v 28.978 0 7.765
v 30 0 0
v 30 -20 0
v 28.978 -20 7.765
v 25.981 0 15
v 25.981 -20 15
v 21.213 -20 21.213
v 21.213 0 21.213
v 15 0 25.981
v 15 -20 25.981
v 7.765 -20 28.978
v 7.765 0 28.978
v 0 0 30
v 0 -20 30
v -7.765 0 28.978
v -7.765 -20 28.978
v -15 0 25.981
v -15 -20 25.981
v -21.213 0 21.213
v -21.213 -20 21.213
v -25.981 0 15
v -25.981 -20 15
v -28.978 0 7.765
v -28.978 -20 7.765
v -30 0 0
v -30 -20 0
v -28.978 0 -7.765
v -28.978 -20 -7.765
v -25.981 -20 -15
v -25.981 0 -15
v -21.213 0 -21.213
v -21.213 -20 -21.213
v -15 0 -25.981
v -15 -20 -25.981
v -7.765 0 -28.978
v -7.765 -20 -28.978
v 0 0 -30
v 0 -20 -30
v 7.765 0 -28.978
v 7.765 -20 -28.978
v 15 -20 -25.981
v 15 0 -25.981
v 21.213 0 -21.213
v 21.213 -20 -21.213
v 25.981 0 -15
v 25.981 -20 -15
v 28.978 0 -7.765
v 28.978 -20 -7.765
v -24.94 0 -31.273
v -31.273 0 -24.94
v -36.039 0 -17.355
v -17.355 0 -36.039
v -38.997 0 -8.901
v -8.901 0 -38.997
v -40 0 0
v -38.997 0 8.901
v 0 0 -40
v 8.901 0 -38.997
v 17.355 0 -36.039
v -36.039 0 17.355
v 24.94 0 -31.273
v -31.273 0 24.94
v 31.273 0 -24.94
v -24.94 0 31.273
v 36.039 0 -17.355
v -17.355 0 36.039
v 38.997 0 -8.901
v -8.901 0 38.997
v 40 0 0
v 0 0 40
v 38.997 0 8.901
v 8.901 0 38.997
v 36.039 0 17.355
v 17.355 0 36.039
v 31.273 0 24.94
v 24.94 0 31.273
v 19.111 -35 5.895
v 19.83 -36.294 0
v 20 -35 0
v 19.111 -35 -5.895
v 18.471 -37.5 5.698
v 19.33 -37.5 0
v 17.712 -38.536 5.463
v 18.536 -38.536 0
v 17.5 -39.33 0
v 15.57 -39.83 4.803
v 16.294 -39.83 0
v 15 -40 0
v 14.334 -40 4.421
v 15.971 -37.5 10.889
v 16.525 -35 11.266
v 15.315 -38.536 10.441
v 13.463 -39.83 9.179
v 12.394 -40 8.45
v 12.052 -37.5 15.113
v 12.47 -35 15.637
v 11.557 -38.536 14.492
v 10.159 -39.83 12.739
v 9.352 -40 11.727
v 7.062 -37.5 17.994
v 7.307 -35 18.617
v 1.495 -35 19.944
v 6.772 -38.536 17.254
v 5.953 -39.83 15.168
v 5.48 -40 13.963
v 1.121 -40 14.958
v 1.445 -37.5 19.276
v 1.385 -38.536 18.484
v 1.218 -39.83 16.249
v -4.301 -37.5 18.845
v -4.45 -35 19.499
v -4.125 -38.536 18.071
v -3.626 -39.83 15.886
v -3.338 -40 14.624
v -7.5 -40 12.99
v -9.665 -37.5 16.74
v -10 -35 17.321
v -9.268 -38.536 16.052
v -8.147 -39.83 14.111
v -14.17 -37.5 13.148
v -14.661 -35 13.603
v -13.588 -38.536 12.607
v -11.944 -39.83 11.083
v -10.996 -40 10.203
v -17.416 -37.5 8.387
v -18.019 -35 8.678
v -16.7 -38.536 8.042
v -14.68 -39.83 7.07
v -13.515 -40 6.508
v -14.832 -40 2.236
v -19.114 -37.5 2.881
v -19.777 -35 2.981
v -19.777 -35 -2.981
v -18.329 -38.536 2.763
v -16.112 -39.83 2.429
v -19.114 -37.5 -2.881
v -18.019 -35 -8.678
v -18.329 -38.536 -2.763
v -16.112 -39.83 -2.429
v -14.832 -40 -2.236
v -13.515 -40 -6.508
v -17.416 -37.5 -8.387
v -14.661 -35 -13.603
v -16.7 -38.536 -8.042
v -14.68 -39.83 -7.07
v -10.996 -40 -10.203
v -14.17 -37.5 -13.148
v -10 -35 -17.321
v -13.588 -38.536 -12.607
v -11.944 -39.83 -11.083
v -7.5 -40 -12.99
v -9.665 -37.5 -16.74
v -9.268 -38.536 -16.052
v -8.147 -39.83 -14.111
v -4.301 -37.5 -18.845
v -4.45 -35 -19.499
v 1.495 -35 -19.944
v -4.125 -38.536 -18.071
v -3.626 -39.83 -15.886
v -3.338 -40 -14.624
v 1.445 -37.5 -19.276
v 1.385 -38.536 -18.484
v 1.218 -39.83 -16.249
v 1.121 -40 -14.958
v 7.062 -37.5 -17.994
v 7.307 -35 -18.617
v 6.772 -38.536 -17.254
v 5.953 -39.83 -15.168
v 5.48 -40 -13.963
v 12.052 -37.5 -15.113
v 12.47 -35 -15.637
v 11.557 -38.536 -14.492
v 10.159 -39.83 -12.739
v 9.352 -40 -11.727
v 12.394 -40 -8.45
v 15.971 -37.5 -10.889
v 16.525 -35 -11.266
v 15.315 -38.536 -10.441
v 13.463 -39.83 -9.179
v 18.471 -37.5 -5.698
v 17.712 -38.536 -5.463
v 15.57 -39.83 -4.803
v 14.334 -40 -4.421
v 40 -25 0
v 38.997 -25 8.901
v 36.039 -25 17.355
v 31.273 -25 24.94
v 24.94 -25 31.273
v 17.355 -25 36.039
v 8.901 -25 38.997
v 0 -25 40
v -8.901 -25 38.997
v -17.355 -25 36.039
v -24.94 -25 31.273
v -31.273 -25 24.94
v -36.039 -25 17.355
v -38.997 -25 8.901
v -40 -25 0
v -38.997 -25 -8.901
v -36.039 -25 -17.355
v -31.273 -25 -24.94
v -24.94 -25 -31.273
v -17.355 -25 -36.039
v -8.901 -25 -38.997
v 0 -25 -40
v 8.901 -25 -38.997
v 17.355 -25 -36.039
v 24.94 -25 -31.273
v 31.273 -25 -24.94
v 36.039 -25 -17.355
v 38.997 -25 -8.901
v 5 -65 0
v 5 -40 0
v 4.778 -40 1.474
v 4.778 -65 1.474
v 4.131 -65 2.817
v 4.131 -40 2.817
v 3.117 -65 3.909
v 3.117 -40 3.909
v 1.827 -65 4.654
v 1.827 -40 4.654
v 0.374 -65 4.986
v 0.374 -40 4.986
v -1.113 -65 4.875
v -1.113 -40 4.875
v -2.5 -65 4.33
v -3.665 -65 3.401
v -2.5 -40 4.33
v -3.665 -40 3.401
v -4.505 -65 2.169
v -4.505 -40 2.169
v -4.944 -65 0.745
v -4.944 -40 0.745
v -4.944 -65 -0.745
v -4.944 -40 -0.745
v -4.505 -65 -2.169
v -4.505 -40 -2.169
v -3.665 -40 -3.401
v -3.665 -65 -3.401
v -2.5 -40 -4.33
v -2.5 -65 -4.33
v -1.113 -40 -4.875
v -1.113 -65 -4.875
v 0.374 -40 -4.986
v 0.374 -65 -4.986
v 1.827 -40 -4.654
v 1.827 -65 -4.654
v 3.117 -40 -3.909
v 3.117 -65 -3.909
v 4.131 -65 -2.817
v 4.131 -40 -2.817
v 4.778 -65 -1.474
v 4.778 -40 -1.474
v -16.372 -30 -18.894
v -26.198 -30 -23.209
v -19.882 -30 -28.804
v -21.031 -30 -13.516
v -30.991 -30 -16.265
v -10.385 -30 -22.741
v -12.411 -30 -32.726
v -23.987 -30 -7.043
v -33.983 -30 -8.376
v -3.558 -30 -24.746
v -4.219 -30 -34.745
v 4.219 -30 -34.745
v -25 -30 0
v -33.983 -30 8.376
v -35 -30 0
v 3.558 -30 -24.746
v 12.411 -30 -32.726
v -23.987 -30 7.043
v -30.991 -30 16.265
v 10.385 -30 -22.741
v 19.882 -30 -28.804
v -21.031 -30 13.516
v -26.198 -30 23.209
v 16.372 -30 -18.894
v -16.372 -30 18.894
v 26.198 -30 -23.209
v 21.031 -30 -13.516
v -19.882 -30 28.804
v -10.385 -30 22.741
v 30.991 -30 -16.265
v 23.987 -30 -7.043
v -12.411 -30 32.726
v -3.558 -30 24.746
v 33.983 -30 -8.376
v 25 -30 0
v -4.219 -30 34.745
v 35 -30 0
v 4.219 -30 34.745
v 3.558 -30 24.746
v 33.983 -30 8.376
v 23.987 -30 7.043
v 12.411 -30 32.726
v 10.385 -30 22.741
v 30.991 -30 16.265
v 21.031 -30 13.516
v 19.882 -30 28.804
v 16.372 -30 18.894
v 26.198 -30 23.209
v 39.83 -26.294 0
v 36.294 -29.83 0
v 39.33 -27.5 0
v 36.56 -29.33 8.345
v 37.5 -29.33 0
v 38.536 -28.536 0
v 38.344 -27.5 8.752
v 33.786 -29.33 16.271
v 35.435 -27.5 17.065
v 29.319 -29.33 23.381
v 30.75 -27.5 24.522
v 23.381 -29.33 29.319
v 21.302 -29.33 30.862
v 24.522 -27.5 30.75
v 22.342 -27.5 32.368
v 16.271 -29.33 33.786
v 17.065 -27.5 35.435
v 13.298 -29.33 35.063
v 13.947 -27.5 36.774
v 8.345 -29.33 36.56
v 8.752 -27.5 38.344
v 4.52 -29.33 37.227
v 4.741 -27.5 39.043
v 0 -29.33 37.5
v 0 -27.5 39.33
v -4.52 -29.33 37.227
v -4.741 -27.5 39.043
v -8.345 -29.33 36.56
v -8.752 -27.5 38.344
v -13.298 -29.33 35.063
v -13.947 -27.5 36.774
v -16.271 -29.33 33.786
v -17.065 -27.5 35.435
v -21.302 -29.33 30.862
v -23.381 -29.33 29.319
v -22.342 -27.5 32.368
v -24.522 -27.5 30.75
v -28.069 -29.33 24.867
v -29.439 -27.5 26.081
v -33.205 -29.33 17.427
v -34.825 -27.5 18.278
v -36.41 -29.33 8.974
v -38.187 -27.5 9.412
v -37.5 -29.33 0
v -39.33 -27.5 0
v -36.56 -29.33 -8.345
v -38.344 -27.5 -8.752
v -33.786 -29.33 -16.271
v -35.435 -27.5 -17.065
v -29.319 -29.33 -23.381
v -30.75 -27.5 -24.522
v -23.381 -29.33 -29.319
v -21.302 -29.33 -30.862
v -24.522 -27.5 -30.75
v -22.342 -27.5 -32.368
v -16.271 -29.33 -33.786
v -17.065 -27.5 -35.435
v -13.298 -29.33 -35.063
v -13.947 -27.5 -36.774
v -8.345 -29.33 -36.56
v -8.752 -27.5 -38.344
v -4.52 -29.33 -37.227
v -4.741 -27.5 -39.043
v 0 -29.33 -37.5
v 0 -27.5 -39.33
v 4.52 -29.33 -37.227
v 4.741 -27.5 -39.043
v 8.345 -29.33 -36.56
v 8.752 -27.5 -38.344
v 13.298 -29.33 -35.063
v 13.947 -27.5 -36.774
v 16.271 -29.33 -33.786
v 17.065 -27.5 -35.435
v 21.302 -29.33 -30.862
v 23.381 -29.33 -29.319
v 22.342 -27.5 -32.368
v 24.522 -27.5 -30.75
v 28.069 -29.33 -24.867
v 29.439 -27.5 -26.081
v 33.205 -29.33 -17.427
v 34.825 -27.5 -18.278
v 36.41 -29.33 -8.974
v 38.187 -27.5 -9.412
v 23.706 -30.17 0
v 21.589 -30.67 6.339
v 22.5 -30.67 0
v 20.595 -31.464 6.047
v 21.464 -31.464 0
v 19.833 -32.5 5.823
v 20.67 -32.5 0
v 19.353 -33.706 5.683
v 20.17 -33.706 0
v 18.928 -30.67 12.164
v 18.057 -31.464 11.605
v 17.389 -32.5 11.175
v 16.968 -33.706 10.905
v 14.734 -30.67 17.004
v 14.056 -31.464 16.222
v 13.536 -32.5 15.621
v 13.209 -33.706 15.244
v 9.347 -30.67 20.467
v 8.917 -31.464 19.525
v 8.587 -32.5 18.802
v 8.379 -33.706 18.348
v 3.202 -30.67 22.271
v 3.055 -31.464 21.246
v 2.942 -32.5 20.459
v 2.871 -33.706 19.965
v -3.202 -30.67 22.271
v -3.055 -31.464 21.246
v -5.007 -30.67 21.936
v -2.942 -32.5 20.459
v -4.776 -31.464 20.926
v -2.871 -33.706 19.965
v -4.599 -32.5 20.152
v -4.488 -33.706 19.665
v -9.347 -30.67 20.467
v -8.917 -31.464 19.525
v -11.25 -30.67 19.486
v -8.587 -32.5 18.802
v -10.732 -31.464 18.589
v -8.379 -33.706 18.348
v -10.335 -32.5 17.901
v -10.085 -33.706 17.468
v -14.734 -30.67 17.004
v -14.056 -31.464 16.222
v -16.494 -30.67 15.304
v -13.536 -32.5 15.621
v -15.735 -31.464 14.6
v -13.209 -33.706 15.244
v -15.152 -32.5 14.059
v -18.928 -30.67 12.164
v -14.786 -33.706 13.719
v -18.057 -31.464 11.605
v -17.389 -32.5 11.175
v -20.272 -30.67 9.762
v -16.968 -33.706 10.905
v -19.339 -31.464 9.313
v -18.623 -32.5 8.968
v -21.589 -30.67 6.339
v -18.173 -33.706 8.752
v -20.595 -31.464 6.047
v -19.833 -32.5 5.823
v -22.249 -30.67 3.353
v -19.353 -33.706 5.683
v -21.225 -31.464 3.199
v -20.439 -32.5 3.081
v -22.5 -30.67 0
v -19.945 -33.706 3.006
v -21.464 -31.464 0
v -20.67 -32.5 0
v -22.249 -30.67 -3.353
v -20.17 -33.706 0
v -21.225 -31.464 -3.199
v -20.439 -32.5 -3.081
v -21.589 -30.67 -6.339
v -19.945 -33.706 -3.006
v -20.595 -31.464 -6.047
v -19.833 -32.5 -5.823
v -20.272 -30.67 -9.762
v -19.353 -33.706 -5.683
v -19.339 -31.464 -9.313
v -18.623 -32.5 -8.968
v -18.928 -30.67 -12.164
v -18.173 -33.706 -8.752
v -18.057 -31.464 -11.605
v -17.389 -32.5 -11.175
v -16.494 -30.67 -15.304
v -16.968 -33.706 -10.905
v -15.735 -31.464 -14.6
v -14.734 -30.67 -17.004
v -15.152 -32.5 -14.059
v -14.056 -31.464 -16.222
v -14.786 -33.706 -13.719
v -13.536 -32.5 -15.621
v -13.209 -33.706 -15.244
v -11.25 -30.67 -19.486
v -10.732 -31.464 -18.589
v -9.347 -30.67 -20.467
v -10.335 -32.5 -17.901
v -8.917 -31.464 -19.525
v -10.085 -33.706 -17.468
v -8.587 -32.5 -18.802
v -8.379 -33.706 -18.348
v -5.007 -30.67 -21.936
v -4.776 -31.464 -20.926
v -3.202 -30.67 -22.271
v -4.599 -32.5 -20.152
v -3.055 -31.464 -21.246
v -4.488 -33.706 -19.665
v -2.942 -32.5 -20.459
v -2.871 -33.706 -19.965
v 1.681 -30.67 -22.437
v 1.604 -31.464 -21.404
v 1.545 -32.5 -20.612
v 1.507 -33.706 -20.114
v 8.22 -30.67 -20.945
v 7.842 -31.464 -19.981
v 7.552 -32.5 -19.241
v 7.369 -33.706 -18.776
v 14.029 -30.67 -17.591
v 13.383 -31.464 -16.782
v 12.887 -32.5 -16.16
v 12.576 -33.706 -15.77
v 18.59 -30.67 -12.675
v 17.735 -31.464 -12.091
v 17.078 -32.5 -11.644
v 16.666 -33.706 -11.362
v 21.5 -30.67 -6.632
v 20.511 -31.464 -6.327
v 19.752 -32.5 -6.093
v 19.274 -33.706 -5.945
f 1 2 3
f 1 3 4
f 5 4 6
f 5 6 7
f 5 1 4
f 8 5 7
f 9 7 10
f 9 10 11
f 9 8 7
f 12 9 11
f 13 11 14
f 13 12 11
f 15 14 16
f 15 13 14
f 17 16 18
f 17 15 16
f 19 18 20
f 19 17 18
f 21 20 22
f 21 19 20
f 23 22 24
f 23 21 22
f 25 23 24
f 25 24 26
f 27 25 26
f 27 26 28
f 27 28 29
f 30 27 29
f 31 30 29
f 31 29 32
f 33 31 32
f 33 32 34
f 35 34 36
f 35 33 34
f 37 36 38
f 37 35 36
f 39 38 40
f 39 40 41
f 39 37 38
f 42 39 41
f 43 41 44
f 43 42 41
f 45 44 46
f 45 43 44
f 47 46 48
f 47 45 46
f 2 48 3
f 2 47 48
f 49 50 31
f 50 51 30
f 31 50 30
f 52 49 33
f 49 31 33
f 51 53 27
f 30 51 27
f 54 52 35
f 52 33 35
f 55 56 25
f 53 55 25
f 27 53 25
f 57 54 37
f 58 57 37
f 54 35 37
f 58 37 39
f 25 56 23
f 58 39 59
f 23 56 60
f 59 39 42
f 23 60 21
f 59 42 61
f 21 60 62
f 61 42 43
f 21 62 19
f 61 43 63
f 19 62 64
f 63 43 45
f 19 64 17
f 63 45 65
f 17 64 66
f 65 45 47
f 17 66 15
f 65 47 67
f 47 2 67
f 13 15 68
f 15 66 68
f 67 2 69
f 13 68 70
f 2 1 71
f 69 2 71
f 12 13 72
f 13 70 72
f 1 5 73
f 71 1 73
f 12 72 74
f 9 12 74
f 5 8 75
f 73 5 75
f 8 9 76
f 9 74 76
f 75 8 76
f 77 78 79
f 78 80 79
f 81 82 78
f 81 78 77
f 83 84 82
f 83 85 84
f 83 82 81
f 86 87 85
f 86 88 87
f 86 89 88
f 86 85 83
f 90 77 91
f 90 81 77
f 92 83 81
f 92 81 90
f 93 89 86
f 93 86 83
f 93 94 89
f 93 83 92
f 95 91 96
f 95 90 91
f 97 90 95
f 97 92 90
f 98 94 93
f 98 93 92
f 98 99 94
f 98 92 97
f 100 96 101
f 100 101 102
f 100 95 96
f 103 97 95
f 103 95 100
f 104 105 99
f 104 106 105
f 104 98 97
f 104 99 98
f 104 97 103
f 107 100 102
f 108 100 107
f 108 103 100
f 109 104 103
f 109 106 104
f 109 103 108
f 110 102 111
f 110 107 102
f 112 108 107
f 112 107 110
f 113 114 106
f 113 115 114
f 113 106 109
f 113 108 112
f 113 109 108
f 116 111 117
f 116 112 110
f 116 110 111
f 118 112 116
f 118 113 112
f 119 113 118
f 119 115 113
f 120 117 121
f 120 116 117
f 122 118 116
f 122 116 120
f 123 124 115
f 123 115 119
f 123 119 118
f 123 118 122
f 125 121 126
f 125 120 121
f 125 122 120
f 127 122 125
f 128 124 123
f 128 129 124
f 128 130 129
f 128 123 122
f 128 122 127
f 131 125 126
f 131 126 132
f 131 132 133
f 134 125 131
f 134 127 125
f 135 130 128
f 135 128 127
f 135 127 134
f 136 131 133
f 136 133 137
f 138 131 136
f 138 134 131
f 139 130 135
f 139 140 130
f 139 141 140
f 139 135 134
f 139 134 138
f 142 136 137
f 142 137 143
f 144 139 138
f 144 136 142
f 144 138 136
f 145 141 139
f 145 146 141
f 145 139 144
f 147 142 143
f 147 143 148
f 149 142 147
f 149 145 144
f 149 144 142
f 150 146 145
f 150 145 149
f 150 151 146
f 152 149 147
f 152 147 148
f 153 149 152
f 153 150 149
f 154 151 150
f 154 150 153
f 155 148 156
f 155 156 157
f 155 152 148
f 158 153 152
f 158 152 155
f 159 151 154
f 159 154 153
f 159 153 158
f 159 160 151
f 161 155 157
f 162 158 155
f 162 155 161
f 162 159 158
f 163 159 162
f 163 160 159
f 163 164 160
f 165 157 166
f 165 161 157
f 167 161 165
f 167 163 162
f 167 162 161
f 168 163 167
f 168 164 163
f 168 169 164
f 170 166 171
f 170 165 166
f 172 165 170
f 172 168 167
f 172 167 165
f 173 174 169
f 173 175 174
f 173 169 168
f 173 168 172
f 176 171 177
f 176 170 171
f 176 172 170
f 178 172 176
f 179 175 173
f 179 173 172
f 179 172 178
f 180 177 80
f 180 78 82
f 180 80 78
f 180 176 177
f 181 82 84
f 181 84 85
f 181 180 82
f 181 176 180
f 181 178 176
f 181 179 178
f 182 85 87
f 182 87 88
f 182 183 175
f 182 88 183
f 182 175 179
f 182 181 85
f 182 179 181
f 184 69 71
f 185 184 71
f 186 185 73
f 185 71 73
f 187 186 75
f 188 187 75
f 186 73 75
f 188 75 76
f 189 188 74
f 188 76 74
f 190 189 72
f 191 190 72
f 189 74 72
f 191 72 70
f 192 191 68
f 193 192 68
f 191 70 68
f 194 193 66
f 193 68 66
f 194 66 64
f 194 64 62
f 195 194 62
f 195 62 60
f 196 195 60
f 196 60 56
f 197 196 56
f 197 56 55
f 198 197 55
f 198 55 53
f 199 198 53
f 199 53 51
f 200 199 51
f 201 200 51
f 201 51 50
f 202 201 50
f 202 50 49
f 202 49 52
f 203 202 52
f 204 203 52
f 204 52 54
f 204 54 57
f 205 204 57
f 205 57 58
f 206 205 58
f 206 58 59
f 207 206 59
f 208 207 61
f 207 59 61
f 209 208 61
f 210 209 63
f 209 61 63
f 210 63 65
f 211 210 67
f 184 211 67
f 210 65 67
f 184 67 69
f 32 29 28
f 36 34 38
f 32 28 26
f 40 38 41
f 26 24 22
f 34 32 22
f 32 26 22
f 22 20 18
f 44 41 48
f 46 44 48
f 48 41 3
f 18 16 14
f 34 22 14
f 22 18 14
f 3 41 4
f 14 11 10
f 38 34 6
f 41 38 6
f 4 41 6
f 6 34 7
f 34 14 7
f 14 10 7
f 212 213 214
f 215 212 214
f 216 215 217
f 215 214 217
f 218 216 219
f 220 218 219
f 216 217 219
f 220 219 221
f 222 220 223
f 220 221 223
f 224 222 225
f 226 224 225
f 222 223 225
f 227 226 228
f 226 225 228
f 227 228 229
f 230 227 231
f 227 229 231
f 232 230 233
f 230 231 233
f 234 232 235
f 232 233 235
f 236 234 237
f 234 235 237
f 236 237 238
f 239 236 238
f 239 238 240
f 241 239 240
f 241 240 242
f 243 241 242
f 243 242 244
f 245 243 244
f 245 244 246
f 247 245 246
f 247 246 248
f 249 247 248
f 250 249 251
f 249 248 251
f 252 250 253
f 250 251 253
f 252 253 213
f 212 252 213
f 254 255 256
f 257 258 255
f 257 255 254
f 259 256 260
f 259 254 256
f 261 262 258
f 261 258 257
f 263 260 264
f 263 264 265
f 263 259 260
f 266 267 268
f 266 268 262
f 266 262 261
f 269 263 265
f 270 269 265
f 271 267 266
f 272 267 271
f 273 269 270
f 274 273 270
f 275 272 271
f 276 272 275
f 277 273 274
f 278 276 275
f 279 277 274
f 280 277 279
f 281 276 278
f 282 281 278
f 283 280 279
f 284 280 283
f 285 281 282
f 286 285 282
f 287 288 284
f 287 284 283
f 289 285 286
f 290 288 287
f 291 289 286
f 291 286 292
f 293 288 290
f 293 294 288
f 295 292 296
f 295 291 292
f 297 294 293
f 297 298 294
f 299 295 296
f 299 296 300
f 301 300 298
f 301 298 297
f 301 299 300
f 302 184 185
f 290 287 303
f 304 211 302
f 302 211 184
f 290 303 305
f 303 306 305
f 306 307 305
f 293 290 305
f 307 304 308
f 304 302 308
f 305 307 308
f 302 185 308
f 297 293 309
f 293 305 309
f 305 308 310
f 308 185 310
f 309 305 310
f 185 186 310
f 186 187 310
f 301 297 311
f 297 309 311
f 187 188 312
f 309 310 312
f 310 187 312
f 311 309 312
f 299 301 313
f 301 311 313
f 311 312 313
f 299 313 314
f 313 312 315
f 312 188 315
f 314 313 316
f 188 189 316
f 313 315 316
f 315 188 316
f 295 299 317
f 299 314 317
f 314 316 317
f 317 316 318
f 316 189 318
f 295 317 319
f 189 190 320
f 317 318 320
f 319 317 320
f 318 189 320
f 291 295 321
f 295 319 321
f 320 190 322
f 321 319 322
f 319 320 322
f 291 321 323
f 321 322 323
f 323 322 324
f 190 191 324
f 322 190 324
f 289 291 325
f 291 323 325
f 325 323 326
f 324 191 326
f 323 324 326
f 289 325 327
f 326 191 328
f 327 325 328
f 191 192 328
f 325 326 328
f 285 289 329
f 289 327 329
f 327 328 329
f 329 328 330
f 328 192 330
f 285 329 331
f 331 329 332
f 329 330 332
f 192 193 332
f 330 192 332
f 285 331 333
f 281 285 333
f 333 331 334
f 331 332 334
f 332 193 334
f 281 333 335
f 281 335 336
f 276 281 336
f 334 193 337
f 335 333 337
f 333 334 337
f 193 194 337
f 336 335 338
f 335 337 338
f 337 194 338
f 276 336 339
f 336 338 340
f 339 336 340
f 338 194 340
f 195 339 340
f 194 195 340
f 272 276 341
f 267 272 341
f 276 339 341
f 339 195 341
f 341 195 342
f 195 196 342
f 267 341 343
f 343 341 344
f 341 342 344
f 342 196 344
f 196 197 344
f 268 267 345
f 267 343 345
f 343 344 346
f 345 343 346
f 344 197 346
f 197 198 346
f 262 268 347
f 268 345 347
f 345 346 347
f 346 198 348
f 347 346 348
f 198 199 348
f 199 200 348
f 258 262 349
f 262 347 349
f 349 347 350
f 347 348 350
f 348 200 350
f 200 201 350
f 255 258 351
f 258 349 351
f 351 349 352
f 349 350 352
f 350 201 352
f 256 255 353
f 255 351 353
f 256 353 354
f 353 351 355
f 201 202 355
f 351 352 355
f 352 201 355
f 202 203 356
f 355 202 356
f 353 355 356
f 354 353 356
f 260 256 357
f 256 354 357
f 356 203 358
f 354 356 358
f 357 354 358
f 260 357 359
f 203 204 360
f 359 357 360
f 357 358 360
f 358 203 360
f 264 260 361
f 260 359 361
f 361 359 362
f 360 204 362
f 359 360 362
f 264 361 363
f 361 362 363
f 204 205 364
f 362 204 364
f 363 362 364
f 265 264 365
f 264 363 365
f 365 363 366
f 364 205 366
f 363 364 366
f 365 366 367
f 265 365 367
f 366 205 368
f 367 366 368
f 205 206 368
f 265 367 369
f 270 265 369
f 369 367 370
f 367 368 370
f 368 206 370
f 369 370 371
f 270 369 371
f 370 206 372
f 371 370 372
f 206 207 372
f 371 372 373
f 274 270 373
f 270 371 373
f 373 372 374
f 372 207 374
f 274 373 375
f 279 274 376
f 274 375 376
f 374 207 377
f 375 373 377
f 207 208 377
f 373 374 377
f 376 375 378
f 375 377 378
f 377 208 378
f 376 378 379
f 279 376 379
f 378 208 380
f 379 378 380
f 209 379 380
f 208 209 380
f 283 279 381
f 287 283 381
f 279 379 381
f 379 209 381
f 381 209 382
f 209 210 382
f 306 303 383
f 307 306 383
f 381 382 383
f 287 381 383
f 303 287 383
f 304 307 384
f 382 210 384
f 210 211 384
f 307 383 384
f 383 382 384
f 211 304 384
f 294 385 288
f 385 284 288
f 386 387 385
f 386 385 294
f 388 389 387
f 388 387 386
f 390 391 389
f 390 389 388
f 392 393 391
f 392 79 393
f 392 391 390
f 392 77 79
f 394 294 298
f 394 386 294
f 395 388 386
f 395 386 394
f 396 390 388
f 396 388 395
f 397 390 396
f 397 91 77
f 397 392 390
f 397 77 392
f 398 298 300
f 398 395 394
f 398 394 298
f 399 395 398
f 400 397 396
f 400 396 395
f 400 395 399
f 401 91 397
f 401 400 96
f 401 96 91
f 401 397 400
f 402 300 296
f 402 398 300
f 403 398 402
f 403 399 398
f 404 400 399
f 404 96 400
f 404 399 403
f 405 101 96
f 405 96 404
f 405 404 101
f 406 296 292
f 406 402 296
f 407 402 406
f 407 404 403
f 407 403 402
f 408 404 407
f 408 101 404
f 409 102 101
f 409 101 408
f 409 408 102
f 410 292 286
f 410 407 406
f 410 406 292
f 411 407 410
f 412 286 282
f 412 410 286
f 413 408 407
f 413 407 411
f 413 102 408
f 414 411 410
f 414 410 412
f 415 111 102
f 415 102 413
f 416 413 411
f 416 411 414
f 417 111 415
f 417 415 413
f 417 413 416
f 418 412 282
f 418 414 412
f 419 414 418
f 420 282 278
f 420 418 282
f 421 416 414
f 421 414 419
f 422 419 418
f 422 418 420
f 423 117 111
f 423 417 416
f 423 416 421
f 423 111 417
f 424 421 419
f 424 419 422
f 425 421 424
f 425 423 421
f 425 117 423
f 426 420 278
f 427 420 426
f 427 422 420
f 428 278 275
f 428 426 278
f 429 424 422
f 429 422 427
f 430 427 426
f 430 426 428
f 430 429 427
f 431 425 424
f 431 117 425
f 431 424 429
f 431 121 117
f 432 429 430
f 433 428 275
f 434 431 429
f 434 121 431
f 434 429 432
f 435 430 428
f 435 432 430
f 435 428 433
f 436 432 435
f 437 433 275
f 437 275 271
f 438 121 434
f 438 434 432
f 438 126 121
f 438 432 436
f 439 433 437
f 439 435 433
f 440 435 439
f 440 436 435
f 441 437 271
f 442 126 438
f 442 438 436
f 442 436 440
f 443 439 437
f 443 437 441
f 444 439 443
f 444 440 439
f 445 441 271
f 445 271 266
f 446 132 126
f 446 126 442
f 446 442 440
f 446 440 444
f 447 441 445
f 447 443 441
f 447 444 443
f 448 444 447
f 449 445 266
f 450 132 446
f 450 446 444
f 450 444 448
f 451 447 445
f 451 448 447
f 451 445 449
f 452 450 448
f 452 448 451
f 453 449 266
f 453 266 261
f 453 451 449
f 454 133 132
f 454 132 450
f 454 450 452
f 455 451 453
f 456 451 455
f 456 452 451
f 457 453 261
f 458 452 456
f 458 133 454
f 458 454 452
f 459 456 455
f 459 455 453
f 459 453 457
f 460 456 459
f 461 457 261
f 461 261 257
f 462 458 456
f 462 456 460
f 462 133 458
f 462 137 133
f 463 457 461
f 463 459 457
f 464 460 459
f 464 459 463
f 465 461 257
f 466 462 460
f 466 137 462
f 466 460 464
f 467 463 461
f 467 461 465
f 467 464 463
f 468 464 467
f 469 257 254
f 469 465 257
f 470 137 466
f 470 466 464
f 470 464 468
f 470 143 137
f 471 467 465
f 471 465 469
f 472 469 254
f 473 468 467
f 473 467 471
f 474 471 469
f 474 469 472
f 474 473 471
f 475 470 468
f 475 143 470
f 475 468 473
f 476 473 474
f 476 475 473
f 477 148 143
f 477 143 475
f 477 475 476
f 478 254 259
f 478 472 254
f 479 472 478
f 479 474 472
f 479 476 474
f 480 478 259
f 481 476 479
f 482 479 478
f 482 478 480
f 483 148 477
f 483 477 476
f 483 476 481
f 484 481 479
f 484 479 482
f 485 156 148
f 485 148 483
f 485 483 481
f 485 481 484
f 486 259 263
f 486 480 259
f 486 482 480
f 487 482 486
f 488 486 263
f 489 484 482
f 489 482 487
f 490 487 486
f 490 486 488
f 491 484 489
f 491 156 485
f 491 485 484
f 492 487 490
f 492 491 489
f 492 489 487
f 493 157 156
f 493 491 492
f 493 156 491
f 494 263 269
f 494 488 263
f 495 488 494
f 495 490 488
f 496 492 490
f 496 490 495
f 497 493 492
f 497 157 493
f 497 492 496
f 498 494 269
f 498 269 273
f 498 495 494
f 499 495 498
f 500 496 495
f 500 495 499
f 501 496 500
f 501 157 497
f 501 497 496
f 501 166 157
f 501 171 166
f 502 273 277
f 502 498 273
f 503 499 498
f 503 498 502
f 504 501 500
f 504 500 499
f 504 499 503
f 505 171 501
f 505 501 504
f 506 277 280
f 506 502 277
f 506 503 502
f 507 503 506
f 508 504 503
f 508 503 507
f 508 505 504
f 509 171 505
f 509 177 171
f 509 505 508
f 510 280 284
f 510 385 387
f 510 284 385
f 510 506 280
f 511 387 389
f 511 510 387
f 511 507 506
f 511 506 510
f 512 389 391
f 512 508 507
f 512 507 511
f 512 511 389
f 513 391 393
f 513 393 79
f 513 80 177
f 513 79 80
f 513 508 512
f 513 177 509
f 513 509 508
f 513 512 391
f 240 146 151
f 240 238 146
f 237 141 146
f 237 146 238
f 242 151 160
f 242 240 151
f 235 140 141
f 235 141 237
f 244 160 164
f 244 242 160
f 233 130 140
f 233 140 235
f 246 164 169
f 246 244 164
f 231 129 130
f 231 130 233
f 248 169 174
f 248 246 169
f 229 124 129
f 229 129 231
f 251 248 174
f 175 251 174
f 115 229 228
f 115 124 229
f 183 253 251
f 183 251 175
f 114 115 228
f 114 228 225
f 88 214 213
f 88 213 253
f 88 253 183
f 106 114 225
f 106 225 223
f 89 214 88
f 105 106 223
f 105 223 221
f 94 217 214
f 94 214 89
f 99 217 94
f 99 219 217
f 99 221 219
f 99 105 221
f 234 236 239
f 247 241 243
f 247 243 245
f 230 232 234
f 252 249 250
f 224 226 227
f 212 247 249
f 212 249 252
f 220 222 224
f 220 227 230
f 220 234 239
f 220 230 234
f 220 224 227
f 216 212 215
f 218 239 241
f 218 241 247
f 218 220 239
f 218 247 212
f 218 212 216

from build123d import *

# Parameters (mm, degrees)
F0_R     = 40
F0_R_2   = 30
F1_DEPTH = 20
F2_R     = 40
F2_R_2   = 30
F3_DEPTH = 10
F4_R     = 20
F5_DEPTH = 10
F6_R     = 5
F7_DEPTH = 25
F8_R     = 4.99999
F9_R     = 5


# Not quite as in the source:
# - a fillet or chamfer is up to 0.001 mm smaller than in the source, because OpenCascade refuses the exact size


with BuildPart() as f1:
    # F0 (on Front) → F1 (new body)
    with BuildSketch(Plane.XZ):
        Circle(F0_R)
        Circle(F0_R_2, mode=Mode.SUBTRACT)
    extrude(amount=F1_DEPTH)

    # F2 (on face) → F3 (join)
    with BuildSketch(Plane.XZ.offset(20)):
        Circle(F2_R)
        Circle(F2_R_2, mode=Mode.SUBTRACT)
        Circle(F2_R_2)
    extrude(amount=F3_DEPTH)

    # F4 (on face) → F5 (join)
    with BuildSketch(Plane.XZ.offset(30)):
        Circle(F4_R)
    extrude(amount=F5_DEPTH)

    # F6 (on face) → F7 (join)
    with BuildSketch(Plane.XZ.offset(40)):
        Circle(F6_R)
    extrude(amount=F7_DEPTH)

    # F8 (radius 5 in the source; OpenCascade refuses exactly that, so slightly less here)
    f8_edges = [f1.edges().sort_by_distance(p)[0] for p in [
        (-20, -30, 0),
        (-20, -40, 0),
    ]]
    fillet(f8_edges, radius=F8_R)

    # F9
    f9_edges = [f1.edges().sort_by_distance(p)[0] for p in [
        (-40, -30, 0),
    ]]
    fillet(f9_edges, radius=F9_R)


solid = f1.part
